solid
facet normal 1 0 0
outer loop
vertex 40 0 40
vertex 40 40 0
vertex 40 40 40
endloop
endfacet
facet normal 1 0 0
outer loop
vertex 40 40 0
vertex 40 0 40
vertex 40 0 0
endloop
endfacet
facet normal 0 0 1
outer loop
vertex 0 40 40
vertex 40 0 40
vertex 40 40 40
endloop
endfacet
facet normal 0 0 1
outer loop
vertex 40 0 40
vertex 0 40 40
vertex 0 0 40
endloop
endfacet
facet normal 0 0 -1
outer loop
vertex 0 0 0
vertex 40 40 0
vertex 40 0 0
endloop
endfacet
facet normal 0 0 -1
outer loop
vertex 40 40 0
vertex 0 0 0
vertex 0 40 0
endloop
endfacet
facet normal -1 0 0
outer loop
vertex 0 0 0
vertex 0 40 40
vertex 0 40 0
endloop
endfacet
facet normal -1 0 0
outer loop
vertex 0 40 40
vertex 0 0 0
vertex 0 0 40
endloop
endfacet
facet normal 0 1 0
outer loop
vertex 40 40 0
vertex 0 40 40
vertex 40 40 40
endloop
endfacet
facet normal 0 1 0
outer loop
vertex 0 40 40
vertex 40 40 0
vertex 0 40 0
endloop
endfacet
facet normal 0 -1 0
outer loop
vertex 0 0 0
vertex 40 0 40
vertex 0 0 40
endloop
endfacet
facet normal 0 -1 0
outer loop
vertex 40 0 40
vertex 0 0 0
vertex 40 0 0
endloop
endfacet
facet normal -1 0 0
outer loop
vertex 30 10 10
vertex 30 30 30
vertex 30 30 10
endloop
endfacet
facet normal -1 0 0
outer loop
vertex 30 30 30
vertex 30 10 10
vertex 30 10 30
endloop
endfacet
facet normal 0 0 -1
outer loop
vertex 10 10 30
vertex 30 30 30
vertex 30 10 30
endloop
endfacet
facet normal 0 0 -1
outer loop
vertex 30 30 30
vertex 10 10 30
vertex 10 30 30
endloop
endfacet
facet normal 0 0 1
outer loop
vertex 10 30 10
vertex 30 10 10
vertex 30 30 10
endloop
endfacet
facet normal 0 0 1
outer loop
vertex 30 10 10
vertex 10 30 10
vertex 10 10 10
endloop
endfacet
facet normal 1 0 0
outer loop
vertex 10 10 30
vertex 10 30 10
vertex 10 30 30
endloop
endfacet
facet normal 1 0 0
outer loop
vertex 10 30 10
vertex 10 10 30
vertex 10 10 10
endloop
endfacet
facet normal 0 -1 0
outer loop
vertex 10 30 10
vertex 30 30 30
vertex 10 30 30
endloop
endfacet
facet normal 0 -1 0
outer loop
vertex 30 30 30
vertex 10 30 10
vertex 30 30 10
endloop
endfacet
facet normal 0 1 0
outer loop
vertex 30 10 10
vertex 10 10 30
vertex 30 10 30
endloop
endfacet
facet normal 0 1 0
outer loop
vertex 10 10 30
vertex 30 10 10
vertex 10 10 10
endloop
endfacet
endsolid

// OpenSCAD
difference() {
    cube([40,40,40]);
    translate([10,10,10])
        cube([20,20,20]);
}
